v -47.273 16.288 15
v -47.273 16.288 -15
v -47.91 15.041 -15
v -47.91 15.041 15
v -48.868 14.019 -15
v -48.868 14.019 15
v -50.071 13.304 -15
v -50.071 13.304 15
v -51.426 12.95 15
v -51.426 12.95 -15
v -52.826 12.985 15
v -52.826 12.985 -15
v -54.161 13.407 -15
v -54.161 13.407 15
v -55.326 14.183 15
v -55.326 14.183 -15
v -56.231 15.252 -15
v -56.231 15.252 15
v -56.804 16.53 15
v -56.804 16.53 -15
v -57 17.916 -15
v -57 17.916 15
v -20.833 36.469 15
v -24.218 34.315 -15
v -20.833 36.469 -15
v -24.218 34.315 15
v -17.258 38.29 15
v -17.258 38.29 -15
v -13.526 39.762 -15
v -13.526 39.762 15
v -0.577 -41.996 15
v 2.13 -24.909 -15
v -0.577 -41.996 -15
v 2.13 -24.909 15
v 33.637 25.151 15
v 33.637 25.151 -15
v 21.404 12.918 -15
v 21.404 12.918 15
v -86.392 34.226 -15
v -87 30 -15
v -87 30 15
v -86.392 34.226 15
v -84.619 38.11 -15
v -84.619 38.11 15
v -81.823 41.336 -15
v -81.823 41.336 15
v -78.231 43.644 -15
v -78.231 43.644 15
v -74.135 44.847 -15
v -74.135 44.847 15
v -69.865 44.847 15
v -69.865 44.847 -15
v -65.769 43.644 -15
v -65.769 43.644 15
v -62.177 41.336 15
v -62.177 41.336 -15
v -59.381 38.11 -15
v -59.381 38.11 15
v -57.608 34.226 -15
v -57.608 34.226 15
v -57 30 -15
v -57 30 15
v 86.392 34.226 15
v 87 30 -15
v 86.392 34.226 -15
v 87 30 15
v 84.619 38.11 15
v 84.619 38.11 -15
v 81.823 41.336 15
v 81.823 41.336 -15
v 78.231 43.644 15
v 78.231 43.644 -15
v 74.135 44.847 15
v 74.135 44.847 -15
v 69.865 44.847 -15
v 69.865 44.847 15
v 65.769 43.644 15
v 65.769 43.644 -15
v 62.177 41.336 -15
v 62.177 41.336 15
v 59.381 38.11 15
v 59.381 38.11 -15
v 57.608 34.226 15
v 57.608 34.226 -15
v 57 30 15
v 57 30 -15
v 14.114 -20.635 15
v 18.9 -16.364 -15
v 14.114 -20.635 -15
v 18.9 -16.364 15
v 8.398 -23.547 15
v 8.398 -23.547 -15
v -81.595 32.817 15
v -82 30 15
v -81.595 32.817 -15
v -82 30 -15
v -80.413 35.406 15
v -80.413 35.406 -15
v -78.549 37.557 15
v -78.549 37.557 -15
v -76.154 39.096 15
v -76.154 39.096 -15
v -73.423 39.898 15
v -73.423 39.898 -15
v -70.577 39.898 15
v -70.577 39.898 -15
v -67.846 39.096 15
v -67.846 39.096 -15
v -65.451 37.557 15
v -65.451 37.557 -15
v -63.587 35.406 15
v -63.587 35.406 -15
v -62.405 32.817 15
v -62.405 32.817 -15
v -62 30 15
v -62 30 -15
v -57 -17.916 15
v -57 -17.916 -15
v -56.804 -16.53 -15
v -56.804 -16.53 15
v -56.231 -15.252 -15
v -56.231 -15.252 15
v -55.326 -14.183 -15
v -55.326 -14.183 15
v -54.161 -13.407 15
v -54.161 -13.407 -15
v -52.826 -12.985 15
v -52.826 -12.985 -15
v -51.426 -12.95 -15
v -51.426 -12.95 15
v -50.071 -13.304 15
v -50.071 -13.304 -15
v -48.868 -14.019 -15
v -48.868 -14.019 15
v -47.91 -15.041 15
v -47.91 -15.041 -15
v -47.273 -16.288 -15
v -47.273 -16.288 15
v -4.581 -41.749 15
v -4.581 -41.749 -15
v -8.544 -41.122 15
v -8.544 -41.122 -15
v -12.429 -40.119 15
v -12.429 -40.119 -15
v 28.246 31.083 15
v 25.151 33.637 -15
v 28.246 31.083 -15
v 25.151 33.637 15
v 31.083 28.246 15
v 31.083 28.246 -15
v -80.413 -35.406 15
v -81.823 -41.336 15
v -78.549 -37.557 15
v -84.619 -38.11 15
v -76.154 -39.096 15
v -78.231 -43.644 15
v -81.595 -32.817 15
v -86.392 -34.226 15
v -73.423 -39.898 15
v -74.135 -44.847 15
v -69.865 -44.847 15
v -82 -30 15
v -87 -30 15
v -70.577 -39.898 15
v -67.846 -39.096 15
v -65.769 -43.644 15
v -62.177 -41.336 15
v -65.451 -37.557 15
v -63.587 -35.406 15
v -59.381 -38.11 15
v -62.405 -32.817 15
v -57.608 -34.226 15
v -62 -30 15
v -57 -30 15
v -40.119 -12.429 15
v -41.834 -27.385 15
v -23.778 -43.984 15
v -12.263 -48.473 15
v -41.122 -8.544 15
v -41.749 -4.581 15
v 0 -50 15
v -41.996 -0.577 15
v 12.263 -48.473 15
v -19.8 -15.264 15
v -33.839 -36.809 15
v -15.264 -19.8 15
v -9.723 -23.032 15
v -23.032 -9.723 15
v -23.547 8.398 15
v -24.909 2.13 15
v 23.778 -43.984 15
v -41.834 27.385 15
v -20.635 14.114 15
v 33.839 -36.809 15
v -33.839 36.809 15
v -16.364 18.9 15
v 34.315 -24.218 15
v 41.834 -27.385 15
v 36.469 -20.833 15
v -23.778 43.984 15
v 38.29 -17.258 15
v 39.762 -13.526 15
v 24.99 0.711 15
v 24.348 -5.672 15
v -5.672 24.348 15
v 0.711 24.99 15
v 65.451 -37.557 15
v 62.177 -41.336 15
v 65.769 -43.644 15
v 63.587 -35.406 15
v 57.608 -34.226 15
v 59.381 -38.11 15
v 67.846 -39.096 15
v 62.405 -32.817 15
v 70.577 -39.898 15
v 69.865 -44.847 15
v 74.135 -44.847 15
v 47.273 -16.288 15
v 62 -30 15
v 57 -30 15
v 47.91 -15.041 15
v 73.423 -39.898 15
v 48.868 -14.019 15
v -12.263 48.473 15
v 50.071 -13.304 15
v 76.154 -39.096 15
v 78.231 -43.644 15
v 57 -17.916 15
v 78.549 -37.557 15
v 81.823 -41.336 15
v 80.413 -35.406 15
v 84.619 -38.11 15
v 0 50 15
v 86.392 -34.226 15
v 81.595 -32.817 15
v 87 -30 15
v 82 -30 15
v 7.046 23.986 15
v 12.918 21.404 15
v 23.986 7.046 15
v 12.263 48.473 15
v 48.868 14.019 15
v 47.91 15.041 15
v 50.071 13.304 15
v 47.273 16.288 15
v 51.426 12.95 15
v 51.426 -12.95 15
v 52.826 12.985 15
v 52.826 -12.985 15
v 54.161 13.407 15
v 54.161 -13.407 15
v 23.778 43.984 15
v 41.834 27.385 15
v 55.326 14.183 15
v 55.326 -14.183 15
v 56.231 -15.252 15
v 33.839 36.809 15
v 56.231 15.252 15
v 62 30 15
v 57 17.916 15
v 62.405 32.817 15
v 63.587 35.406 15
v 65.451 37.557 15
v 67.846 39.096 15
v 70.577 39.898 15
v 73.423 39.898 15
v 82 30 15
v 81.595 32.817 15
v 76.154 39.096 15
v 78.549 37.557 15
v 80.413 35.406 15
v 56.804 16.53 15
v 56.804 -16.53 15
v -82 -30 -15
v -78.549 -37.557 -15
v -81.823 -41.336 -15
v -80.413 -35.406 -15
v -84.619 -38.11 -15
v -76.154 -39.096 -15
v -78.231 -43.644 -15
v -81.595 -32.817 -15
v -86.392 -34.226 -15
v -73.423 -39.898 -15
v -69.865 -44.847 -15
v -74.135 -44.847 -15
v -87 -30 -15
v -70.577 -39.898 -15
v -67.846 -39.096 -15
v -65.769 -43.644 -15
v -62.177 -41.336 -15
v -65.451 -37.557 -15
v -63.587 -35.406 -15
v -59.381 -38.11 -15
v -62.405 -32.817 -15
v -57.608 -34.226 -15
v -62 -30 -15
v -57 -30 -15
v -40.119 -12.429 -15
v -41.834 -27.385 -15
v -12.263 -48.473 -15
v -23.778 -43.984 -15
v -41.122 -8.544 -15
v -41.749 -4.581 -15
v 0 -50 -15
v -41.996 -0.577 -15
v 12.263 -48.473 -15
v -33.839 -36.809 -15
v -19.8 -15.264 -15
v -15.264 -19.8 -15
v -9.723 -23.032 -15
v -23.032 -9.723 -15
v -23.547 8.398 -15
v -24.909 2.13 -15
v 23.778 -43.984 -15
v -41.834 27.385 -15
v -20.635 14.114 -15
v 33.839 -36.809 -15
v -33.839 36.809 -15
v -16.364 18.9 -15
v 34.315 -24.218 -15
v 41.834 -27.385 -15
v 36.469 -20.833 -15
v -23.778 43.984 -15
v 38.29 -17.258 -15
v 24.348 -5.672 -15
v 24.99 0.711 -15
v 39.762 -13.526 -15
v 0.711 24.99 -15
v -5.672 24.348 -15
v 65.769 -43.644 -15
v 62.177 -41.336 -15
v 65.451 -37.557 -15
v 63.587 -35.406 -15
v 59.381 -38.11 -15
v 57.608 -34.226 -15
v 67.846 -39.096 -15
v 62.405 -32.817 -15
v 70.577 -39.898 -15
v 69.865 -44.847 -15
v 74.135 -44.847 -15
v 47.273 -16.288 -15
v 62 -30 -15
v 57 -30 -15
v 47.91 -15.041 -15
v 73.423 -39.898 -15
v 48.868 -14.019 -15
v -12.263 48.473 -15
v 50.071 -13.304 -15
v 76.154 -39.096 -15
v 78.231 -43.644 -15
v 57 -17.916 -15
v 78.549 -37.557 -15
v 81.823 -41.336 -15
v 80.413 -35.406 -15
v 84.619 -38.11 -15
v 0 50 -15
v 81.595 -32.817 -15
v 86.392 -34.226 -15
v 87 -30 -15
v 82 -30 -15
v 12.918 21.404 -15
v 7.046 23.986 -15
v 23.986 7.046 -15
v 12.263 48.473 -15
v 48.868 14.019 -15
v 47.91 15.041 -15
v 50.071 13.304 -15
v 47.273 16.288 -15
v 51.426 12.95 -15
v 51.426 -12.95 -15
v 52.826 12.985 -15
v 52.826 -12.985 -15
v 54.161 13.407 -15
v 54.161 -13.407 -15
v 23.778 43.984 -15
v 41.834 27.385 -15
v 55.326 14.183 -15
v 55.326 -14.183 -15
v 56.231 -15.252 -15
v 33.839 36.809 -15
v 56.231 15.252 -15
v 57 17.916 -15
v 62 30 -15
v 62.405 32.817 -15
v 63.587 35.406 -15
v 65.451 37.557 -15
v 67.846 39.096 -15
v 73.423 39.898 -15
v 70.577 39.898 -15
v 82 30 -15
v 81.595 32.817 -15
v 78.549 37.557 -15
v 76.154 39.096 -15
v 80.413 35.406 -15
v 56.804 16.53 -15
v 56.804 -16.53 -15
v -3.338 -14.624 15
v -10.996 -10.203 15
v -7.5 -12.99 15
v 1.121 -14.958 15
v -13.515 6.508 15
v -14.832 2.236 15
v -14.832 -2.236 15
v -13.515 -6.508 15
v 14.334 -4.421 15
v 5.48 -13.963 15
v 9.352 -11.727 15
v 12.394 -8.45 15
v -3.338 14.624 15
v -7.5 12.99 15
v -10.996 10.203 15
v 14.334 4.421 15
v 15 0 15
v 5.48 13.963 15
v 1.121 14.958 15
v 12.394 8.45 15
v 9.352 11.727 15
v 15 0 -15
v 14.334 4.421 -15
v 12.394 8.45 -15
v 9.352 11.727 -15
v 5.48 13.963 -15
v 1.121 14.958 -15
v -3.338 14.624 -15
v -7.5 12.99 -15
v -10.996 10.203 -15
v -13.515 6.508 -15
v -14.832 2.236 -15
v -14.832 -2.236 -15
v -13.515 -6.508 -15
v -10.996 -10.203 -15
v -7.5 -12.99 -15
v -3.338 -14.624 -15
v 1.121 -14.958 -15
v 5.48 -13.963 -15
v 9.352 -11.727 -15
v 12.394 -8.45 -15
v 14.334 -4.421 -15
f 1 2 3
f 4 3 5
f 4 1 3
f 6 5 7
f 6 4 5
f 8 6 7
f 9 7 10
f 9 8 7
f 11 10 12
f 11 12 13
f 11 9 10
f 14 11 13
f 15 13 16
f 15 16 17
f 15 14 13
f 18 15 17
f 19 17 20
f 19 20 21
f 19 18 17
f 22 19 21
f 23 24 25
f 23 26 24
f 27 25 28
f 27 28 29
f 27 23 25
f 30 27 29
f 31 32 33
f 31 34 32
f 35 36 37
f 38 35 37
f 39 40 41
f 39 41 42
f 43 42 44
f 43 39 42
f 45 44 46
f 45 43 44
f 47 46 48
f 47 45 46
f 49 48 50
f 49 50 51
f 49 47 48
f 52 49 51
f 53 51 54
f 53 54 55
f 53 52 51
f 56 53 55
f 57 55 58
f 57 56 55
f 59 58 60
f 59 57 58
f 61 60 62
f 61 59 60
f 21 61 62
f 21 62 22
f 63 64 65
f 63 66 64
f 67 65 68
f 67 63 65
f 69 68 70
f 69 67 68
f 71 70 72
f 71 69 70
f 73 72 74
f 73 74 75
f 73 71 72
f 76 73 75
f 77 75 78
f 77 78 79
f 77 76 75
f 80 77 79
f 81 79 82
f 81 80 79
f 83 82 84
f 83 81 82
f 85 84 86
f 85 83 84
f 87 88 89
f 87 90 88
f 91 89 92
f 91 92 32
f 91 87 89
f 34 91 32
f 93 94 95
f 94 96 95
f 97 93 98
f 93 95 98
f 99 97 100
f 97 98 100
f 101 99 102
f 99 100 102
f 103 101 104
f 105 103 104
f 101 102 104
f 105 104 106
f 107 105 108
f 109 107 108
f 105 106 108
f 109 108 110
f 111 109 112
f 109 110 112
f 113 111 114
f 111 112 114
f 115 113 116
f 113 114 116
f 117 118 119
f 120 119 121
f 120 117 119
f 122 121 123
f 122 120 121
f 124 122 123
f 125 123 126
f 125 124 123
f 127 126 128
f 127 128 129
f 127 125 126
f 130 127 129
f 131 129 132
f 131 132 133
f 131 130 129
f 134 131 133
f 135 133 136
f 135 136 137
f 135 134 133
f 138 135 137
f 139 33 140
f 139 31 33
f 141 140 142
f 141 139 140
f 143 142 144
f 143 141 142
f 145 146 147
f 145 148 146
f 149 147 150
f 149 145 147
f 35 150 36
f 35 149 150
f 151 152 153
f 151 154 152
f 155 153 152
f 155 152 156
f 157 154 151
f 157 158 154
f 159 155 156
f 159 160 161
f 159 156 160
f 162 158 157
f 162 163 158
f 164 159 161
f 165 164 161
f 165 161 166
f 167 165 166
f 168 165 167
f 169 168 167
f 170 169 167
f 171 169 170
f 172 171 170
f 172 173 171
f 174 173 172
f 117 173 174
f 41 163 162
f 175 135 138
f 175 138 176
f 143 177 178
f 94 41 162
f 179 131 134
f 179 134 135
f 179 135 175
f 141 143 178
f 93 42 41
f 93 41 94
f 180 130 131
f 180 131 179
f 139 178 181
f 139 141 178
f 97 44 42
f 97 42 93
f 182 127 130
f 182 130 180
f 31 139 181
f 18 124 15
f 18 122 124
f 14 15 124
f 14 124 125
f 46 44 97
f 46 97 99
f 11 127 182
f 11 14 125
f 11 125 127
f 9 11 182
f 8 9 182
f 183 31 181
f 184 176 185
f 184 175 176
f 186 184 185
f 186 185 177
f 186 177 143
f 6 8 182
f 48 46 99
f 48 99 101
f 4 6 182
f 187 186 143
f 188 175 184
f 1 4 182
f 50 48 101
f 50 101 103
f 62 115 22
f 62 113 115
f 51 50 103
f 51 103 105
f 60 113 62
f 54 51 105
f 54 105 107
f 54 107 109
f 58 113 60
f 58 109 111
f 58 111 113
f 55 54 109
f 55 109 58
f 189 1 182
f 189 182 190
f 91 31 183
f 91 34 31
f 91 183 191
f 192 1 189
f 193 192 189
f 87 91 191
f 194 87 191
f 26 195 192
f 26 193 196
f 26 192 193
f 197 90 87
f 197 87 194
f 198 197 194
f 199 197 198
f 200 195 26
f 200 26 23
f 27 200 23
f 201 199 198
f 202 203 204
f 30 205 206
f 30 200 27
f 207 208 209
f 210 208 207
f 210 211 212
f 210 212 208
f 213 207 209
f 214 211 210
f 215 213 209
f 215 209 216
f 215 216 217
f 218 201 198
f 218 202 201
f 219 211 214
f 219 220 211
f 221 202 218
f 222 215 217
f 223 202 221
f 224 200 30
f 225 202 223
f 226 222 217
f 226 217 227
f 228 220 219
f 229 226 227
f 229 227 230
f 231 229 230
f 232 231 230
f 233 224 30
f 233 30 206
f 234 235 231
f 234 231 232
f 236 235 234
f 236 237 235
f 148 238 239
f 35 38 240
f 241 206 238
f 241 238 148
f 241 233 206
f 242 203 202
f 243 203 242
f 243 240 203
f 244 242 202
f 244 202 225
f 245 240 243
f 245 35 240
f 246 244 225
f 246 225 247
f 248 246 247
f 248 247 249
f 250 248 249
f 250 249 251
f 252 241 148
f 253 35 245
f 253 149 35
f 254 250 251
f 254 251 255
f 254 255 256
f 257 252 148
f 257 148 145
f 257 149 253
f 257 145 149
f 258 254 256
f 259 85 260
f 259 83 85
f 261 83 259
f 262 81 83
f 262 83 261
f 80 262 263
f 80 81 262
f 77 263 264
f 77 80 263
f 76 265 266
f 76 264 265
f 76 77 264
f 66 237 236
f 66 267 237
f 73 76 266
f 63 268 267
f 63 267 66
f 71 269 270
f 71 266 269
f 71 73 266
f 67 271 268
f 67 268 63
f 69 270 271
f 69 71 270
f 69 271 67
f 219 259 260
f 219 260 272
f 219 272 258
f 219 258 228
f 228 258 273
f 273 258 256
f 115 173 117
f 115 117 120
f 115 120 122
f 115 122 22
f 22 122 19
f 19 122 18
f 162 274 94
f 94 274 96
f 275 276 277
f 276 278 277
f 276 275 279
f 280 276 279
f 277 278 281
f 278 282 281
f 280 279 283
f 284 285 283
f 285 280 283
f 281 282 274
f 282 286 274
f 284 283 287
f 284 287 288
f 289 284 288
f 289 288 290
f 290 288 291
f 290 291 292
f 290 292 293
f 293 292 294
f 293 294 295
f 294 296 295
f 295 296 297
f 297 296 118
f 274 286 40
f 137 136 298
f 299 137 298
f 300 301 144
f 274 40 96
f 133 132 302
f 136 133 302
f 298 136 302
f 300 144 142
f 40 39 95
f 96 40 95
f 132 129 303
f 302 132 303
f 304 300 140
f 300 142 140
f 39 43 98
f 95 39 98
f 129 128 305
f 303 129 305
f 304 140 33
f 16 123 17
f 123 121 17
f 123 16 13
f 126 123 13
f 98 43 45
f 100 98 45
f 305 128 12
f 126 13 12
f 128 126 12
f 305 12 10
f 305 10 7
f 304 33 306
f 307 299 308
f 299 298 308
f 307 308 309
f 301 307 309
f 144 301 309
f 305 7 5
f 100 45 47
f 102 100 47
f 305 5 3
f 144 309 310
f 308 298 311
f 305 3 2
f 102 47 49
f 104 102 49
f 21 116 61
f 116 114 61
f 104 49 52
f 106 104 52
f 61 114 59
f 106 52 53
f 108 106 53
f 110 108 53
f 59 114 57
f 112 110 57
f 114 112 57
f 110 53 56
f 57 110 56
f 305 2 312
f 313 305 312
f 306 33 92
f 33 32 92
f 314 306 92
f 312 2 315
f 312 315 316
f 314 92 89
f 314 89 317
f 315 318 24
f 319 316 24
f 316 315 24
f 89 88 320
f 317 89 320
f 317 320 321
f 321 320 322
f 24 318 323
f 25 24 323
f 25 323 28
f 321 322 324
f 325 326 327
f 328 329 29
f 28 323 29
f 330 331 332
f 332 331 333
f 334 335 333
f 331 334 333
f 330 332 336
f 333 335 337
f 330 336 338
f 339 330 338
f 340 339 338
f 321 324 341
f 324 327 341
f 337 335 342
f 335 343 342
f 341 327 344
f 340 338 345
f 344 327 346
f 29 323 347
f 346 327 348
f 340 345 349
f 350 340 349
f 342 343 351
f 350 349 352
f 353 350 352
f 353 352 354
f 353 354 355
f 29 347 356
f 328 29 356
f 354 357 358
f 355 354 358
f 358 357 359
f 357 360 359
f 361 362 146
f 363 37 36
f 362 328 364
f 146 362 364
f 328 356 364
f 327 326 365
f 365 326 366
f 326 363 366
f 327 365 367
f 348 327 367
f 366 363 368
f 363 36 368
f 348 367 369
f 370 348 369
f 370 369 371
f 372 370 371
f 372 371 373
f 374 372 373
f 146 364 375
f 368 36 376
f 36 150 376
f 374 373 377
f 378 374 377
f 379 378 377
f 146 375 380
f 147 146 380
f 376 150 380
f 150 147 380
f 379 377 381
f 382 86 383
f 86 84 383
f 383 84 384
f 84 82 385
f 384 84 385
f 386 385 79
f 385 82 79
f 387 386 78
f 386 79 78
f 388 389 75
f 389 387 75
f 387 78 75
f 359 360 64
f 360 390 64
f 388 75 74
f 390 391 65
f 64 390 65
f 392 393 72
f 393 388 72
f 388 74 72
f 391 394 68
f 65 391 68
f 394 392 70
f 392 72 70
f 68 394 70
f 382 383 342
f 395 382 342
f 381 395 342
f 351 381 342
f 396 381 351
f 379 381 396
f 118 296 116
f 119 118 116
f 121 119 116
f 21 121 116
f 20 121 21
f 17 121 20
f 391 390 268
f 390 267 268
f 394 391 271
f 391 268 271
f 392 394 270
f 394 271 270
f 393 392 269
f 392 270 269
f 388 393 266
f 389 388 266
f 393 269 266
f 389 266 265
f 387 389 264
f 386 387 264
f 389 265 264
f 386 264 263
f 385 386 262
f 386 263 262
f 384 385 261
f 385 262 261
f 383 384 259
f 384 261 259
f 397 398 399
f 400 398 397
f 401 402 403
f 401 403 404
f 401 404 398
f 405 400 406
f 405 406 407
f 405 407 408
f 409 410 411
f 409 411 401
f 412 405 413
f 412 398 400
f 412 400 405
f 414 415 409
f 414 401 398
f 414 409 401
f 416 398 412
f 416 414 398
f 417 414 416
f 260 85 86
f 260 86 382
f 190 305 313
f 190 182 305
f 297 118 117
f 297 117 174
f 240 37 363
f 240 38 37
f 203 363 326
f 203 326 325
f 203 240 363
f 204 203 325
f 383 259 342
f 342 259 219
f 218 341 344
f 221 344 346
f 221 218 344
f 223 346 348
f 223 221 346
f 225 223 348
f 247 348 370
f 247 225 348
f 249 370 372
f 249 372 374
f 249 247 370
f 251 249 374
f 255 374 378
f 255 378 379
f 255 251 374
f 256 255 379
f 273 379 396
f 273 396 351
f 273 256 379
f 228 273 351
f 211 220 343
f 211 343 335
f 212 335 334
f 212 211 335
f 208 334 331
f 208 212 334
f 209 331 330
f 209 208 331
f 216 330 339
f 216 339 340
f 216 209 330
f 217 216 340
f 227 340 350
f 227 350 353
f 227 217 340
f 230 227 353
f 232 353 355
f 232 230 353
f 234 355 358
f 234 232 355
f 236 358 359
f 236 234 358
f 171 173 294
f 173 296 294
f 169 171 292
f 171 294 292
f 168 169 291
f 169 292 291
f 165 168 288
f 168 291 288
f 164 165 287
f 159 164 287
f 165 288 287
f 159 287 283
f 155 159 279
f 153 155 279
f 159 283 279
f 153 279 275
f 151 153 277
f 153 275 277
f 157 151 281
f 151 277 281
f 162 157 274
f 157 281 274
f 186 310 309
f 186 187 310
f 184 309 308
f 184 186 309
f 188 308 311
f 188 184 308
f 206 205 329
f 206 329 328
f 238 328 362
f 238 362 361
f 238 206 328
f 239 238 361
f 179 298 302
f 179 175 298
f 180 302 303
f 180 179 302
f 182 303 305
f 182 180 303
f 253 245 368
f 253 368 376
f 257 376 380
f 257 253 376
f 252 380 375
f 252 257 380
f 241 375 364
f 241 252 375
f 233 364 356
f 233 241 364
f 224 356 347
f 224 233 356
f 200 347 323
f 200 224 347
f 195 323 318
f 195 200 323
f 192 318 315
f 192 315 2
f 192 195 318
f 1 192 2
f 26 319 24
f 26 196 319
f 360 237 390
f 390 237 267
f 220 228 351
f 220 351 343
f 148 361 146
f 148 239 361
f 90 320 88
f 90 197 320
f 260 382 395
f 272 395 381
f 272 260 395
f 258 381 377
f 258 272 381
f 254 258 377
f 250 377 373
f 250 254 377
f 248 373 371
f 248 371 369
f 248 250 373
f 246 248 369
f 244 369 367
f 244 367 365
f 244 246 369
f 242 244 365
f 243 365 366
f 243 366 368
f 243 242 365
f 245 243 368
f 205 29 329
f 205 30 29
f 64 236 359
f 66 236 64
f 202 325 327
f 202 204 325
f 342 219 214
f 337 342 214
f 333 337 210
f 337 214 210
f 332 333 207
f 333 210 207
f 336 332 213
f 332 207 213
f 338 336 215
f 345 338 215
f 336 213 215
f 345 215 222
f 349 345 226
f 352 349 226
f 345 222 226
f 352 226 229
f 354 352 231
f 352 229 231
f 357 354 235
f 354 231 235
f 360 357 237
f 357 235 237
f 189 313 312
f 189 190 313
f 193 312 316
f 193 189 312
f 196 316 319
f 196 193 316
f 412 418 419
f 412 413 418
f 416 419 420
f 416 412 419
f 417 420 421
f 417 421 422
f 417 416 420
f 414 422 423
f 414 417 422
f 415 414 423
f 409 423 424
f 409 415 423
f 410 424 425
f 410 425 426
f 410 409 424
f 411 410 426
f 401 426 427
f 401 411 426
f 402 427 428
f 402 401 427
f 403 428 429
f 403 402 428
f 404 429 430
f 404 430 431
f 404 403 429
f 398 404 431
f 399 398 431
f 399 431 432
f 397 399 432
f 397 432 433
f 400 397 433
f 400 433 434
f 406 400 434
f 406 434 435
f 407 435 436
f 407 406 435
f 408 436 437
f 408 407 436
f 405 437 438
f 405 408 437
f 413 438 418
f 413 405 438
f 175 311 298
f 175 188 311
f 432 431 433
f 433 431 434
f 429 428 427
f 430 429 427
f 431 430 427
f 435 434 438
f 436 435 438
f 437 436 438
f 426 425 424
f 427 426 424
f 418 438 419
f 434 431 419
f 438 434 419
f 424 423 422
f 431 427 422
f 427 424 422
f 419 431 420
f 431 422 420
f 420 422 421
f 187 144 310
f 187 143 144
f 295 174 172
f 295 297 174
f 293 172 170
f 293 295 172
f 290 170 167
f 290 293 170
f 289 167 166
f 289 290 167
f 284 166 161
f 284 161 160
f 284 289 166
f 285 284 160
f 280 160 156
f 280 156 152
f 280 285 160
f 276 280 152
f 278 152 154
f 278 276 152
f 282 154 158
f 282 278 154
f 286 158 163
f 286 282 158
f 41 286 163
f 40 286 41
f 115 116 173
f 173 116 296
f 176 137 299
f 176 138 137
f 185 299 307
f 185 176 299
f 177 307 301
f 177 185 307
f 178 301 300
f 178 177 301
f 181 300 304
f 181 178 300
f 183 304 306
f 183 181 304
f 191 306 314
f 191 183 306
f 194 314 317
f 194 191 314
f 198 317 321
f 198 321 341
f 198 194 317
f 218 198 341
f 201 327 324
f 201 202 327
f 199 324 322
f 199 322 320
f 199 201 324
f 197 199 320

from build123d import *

# Parameters (mm, degrees)
SKETCH1_R           = 15
BOSS_EXTRUDE1_DEPTH = 15
BOSS_EXTRUDE2_DEPTH = 15
BOSS_EXTRUDE3_DEPTH = 15


with BuildPart() as part:
    # Sketch1 → Boss-Extrude1 (new, symmetric)
    with BuildSketch(Plane.XY):
        Circle(SKETCH1_R)
    extrude(amount=BOSS_EXTRUDE1_DEPTH, both=True)


with BuildPart() as body_2:
    # Sketch1<3> → Boss-Extrude2 (new, symmetric)
    with BuildSketch(Plane.XY):
        with BuildLine():
            Line((57, -17.916472867), (57, 17.916472867))
            ThreePointArc((57, 17.916472867), (52.825722824, 12.985126011), (47.272727273, 16.287702607))
            ThreePointArc((47.272727273, 16.287702607), (0, 50), (-47.272727273, 16.287702607))
            ThreePointArc((-47.272727273, 16.287702607), (-52.825722824, 12.985126011), (-57, 17.916472867))
            Line((-57, 17.916472867), (-57, -17.916472867))
            ThreePointArc((-57, -17.916472867), (-52.825722824, -12.985126011), (-47.272727273, -16.287702607))
            ThreePointArc((-47.272727273, -16.287702607), (0, -50), (47.272727273, -16.287702607))
            ThreePointArc((47.272727273, -16.287702607), (52.825722824, -12.985126011), (57, -17.916472867))
        make_face()
        with BuildLine():
            ThreePointArc((-5.672002568, 24.348067415), (3.910861626, 24.692208515), (12.918361615, 21.403642989))
            Line((12.918361615, 21.403642989), (25.151236226, 33.636517601))
            ThreePointArc((25.151236226, 33.636517601), (29.69848481, 29.69848481), (33.636517601, 25.151236226))
            Line((33.636517601, 25.151236226), (21.403642989, 12.918361615))
            ThreePointArc((21.403642989, 12.918361615), (24.692208515, 3.910861626), (24.348067415, -5.672002568))
            Line((24.348067415, -5.672002568), (39.762388673, -13.525991536))
            ThreePointArc((39.762388673, -13.525991536), (37.422274016, -19.067600989), (34.314502676, -24.218069826))
            Line((34.314502676, -24.218069826), (18.900181419, -16.364080859))
            ThreePointArc((18.900181419, -16.364080859), (11.349762493, -22.275163105), (2.129571608, -24.90913336))
            Line((2.129571608, -24.90913336), (-0.576728553, -41.996040101))
            ThreePointArc((-0.576728553, -41.996040101), (-6.570247532, -41.482910305), (-12.42898864, -40.118826521))
            Line((-12.42898864, -40.118826521), (-9.722688479, -23.03191978))
            ThreePointArc((-9.722688479, -23.03191978), (-17.67766953, -17.67766953), (-23.03191978, -9.722688479))
            Line((-23.03191978, -9.722688479), (-40.118826521, -12.42898864))
            ThreePointArc((-40.118826521, -12.42898864), (-41.482910305, -6.570247532), (-41.996040101, -0.576728553))
            Line((-41.996040101, -0.576728553), (-24.90913336, 2.129571608))
            ThreePointArc((-24.90913336, 2.129571608), (-22.275163105, 11.349762493), (-16.364080859, 18.900181419))
            Line((-16.364080859, 18.900181419), (-24.218069826, 34.314502676))
            ThreePointArc((-24.218069826, 34.314502676), (-19.067600989, 37.422274016), (-13.525991536, 39.762388673))
            Line((-13.525991536, 39.762388673), (-5.672002568, 24.348067415))
        make_face(mode=Mode.SUBTRACT)
    extrude(amount=BOSS_EXTRUDE2_DEPTH, both=True)

    # Sketch1<4> → Boss-Extrude3 (add, symmetric)
    # profile 1 of 2: a face of its own
    with BuildSketch(Plane.XY):
        with BuildLine():
            Line((87, -30), (87, 30))
            ThreePointArc((87, 30), (72, 45), (57, 30))
            Line((57, 30), (57, -30))
            ThreePointArc((57, -30), (72, -45), (87, -30))
        make_face()
        with BuildLine():
            ThreePointArc((62, 30), (72, 40), (82, 30))
            Line((82, 30), (82, -30))
            ThreePointArc((82, -30), (72, -40), (62, -30))
            Line((62, -30), (62, 30))
        make_face(mode=Mode.SUBTRACT)
    # profile 2 of 2: a face of its own
    with BuildSketch(Plane.XY):
        with BuildLine():
            Line((-57, -30), (-57, 30))
            ThreePointArc((-57, 30), (-72, 45), (-87, 30))
            Line((-87, 30), (-87, -30))
            ThreePointArc((-87, -30), (-72, -45), (-57, -30))
        make_face()
        with BuildLine():
            Line((-82, -30), (-82, 30))
            ThreePointArc((-82, 30), (-72, 40), (-62, 30))
            Line((-62, 30), (-62, -30))
            ThreePointArc((-62, -30), (-72, -40), (-82, -30))
        make_face(mode=Mode.SUBTRACT)
    extrude(amount=BOSS_EXTRUDE3_DEPTH, both=True)


solid = Compound([part.part, body_2.part])
